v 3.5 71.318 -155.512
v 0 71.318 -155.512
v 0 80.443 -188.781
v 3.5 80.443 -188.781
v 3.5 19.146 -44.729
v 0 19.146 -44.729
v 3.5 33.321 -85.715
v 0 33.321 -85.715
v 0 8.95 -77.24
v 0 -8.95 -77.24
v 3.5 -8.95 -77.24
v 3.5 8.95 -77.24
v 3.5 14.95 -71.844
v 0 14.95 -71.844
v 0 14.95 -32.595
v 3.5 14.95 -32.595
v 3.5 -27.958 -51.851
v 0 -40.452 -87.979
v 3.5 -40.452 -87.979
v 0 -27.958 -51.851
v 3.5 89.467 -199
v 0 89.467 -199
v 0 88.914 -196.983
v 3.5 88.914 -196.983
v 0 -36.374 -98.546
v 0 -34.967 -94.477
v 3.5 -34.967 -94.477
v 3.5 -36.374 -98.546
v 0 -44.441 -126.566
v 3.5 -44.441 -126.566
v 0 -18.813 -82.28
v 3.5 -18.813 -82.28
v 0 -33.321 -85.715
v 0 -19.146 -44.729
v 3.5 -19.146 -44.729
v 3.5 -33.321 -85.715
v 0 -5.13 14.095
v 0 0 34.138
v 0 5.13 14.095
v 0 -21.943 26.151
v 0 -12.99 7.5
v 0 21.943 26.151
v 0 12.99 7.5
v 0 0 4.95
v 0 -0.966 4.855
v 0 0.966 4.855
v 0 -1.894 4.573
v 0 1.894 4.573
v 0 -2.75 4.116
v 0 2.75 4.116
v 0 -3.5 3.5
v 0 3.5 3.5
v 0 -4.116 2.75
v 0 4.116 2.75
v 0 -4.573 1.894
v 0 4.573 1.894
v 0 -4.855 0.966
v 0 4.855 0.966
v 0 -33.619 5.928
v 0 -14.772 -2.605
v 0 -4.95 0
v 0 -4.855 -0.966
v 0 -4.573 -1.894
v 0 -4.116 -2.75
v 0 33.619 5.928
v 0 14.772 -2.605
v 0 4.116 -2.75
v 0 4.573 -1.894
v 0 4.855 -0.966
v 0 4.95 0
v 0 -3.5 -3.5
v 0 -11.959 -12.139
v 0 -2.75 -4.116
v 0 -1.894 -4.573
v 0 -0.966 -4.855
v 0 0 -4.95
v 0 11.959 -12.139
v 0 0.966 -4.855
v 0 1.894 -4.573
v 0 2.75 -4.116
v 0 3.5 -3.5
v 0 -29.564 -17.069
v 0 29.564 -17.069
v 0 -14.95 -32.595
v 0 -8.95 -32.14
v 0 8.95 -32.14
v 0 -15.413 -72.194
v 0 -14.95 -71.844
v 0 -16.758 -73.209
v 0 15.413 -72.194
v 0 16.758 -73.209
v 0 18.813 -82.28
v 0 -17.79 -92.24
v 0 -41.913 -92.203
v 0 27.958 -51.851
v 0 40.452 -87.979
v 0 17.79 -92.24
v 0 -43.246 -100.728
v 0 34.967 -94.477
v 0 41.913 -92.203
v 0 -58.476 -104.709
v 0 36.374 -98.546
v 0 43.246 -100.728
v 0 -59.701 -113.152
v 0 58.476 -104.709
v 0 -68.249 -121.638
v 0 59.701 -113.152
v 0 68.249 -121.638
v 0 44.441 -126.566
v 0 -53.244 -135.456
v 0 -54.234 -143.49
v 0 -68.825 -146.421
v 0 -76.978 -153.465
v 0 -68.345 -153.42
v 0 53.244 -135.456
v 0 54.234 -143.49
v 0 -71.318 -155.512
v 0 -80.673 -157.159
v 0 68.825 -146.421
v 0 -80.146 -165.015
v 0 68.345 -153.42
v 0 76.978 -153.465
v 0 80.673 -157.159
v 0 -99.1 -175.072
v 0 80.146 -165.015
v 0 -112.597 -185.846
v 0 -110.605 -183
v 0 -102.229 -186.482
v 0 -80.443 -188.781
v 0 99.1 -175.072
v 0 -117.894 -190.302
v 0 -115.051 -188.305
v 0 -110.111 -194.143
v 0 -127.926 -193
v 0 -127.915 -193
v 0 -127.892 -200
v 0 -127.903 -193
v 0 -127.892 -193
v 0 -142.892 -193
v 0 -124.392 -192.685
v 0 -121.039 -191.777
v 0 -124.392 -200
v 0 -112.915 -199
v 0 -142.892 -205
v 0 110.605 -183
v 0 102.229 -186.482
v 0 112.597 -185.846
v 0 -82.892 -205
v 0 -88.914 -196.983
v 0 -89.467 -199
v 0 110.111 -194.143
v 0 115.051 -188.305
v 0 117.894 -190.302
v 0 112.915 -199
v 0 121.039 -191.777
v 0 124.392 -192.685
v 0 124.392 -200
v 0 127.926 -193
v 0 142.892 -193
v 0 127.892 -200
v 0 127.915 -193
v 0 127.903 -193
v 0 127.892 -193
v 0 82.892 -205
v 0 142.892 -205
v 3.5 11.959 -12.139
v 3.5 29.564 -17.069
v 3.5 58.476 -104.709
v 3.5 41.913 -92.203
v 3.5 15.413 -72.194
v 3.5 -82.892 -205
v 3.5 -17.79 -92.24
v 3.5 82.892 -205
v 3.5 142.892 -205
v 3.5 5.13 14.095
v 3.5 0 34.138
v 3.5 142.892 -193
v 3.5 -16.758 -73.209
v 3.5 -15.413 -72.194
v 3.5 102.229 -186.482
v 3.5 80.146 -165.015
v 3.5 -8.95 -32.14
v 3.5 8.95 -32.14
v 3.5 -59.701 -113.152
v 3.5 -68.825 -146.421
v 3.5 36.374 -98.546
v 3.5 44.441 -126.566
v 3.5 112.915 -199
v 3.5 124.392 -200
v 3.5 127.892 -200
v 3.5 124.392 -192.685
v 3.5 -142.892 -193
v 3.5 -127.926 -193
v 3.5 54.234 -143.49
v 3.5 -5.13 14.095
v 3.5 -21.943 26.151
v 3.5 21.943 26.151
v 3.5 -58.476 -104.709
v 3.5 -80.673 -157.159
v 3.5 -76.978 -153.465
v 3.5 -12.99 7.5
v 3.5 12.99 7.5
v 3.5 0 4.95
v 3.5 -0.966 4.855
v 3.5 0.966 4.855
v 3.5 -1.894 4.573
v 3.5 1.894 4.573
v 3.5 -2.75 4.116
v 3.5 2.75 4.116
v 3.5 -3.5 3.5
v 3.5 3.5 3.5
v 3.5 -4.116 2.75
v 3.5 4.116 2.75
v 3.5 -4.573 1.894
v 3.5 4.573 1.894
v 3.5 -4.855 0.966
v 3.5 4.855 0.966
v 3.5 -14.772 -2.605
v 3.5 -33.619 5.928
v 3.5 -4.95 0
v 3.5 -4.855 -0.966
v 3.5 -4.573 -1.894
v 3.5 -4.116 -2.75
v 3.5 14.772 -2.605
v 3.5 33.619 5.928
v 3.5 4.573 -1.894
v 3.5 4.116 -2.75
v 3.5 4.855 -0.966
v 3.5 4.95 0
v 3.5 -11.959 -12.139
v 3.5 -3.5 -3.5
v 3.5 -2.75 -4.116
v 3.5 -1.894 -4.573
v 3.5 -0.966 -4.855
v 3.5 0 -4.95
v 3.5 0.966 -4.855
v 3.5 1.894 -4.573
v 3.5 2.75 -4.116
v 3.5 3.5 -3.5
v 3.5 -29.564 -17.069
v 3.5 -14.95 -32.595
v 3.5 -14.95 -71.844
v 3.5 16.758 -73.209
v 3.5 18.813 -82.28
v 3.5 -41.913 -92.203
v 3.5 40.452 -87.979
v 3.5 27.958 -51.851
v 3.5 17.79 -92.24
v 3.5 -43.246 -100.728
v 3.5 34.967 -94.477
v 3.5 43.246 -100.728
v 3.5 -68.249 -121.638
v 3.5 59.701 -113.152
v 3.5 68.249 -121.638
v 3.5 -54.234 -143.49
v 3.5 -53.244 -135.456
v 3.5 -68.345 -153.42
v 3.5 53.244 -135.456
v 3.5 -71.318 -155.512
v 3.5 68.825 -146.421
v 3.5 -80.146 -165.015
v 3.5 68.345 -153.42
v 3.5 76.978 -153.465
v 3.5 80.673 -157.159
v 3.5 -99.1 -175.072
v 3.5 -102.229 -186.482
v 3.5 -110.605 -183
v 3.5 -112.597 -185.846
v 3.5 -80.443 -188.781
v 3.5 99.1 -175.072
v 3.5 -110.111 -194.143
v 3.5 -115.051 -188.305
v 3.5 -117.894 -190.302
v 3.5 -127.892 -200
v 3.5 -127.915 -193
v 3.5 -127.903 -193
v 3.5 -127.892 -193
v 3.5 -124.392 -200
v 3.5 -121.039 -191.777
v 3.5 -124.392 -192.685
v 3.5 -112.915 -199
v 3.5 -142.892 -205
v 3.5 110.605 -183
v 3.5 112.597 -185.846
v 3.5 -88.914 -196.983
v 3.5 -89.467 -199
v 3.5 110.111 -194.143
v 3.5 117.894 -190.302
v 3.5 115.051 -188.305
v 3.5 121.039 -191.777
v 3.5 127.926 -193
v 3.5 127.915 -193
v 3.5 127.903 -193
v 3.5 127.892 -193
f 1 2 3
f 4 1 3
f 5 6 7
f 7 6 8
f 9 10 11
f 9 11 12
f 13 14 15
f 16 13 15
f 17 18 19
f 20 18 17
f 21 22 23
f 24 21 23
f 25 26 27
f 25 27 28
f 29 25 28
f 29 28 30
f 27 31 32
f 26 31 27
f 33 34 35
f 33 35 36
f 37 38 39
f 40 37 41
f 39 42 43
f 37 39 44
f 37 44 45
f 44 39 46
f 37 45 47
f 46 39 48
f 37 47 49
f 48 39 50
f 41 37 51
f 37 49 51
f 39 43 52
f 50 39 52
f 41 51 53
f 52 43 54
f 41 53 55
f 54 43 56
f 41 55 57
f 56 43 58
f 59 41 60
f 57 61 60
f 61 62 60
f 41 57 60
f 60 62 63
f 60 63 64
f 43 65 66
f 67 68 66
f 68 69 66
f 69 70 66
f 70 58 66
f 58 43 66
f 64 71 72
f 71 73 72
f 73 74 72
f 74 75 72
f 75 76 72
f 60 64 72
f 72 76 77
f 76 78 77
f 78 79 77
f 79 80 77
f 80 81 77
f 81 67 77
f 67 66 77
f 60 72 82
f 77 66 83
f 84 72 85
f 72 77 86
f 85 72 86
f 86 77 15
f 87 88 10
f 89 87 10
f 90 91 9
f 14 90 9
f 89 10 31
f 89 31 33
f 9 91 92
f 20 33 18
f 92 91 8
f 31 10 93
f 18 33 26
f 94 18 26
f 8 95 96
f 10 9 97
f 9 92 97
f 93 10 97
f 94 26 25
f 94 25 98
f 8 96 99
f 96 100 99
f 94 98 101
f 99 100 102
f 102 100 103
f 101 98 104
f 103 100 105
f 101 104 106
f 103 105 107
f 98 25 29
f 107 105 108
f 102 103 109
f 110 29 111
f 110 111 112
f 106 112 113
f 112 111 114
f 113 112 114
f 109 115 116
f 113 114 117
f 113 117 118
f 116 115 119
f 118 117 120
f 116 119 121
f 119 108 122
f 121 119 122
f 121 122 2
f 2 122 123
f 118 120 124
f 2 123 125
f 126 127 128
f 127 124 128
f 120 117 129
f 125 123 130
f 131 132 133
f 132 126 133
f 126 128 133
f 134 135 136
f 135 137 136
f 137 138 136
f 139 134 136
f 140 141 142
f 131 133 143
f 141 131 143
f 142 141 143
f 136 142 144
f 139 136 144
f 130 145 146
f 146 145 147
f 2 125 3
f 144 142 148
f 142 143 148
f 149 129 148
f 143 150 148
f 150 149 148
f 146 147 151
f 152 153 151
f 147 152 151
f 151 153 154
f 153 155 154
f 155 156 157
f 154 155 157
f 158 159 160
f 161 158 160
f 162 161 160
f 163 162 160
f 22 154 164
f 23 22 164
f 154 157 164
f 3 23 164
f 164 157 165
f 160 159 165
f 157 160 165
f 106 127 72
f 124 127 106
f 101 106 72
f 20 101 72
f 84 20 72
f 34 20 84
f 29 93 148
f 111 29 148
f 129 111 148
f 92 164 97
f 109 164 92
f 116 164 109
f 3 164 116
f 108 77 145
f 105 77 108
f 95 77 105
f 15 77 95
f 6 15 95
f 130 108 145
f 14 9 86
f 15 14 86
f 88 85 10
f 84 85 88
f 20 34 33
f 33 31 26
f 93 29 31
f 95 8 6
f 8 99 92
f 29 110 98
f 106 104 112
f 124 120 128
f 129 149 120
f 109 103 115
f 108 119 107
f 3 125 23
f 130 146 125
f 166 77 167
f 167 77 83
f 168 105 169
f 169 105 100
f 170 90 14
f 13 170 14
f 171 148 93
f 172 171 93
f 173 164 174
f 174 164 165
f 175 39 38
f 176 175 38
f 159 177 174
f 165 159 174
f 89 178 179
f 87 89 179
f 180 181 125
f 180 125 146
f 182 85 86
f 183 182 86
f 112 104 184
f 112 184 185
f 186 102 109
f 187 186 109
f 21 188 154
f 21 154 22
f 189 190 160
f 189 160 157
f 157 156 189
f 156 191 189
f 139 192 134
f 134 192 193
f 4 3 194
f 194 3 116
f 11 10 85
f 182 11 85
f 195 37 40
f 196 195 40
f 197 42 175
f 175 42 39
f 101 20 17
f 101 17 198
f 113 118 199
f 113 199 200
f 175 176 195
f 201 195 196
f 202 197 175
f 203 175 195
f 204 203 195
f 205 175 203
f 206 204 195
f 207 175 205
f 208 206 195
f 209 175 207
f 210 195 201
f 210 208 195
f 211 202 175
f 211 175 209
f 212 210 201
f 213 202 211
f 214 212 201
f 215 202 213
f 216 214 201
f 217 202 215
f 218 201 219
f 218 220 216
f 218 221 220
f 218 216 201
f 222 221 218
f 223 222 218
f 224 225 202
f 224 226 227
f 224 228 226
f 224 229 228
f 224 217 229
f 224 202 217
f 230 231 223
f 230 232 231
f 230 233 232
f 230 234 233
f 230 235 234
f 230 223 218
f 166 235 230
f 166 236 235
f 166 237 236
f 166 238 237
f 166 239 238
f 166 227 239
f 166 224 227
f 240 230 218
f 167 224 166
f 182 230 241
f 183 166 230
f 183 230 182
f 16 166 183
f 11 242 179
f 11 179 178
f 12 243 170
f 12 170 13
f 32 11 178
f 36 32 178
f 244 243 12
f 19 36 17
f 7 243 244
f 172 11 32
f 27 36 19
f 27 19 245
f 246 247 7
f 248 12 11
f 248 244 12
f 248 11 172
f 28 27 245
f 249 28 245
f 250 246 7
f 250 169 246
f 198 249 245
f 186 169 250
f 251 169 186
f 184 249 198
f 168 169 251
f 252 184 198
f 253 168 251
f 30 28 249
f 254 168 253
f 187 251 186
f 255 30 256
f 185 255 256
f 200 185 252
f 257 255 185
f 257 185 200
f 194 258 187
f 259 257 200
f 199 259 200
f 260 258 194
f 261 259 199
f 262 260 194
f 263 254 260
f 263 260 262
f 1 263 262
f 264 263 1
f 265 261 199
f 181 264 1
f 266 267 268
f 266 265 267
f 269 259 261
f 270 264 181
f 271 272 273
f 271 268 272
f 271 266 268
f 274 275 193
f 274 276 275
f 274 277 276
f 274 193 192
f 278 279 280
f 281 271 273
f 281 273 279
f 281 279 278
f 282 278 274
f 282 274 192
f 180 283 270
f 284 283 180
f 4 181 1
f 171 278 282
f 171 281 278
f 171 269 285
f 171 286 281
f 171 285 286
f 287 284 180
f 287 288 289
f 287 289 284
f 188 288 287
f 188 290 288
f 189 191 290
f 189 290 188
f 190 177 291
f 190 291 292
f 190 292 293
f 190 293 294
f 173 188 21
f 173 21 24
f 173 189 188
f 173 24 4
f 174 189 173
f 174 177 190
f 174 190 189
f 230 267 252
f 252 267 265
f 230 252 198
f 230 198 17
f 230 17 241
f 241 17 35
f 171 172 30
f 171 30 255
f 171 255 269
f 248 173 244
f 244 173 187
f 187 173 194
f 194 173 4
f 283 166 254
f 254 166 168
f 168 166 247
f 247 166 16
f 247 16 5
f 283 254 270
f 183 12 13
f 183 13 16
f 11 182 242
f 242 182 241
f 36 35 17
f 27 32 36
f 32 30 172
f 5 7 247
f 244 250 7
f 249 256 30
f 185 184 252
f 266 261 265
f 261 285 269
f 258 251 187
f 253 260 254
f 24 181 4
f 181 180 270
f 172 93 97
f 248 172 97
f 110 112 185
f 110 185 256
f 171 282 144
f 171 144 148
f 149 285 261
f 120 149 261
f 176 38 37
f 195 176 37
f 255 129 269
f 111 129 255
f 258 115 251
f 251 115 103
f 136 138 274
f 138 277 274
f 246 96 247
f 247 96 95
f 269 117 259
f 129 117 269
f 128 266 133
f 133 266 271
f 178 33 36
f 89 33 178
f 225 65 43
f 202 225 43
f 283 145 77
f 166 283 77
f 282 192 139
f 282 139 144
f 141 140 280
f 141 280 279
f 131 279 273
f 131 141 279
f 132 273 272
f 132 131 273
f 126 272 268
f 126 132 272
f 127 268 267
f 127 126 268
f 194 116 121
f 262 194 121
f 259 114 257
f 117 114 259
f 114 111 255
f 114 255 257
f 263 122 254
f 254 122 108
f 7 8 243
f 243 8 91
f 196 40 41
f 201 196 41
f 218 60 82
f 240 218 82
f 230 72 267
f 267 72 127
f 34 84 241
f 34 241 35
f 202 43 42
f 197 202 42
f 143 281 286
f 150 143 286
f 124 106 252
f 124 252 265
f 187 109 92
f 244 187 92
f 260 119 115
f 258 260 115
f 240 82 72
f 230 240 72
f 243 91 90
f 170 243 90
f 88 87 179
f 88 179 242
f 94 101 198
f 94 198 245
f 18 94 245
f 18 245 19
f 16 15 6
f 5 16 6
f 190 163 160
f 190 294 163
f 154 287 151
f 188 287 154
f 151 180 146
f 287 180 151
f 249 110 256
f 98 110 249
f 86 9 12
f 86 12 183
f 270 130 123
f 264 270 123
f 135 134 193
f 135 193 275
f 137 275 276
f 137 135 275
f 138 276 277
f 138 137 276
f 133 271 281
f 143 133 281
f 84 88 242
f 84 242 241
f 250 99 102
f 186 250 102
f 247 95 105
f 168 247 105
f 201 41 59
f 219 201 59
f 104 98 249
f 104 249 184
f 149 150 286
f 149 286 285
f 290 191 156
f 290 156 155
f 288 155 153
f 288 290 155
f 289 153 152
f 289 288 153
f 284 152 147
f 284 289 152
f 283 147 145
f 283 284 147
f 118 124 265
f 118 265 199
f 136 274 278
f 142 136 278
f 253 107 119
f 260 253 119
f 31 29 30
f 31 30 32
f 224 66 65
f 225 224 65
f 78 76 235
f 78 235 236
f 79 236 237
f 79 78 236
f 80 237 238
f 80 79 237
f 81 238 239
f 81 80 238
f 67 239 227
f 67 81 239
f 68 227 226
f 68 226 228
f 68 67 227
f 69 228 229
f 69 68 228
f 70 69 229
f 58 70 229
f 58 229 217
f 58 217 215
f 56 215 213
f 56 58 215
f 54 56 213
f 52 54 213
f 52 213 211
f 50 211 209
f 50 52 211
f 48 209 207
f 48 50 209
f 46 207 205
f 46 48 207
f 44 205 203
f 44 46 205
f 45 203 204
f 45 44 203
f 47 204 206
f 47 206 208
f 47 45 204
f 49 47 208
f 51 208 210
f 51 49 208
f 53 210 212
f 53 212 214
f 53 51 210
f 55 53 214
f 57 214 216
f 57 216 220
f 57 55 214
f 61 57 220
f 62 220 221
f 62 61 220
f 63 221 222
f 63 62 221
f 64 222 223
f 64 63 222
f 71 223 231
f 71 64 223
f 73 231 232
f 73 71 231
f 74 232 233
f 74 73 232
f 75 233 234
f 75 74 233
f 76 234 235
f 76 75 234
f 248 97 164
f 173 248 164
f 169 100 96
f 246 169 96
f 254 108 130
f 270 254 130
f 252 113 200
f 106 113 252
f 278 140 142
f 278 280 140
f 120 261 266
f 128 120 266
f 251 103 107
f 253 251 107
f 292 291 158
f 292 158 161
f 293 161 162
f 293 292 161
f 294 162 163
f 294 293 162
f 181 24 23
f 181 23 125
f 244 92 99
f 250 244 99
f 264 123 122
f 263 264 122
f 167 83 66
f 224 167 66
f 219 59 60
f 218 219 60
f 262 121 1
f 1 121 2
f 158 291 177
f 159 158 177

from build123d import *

# Parameters (mm, degrees)
SKETCH1_R               = 4.95
SKETCH1_W               = 17.9
SKETCH1_H               = 45.1
BOSS_EXTRUDE1_DEPTH     = 3.5
CUT_EXTRUDE1_DEPTH      = 251.796682357
CUT_EXTRUDE1_DEPTH_BACK = 251.796682357
SKETCH2_W               = 258.160615752
SKETCH2_H               = 10
SKETCH3_W               = 12
SKETCH3_H               = 60
BOSS_EXTRUDE2_DEPTH     = 3.5
FILLET1_R               = 20
BOSS_EXTRUDE3_START     = -3.5
BOSS_EXTRUDE3_DEPTH     = 3.5
CIRPATTERN1_COUNT       = 9
SKETCH5_W               = 17
SKETCH5_H               = 3.5
CUT_EXTRUDE2_DEPTH      = 250.910895112
CUT_EXTRUDE3_DEPTH      = 250.910895112


with BuildPart() as part:
    # Sketch1 → Boss-Extrude1 (new body)
    with BuildSketch(Plane.YZ):
        with BuildLine():
            Line((-10.899695646, -10.305175148), (-129.080307876, -215))
            Line((-129.080307876, -215), (-88.665789032, -215))
            Line((-88.665789032, -215), (-17.790269987, -92.24))
            Line((-17.790269987, -92.24), (17.790269987, -92.24))
            Line((17.790269987, -92.24), (88.665789032, -215))
            Line((88.665789032, -215), (129.080307876, -215))
            Line((129.080307876, -215), (10.899695646, -10.305175148))
            ThreePointArc((10.899695646, -10.305175148), (0, 15), (-10.899695646, -10.305175148))
        make_face()
        Circle(SKETCH1_R, mode=Mode.SUBTRACT)
        with Locations((0, -54.69)):
            Rectangle(SKETCH1_W, SKETCH1_H, mode=Mode.SUBTRACT)
    extrude(amount=BOSS_EXTRUDE1_DEPTH)

    # Sketch2 → Cut-Extrude1 (cut, two sides: drawn at the far end of the back side and taken through both)
    with BuildSketch(Plane.YZ.offset(3.5).offset(-CUT_EXTRUDE1_DEPTH_BACK)):
        with Locations((0, -210)):
            Rectangle(SKETCH2_W, SKETCH2_H)
    extrude(amount=CUT_EXTRUDE1_DEPTH + CUT_EXTRUDE1_DEPTH_BACK, mode=Mode.SUBTRACT)

    # Sketch3 → Boss-Extrude2 (add)
    with BuildSketch(Plane(origin=(3.5, 0, 0), x_dir=(0, 0, -1), z_dir=(1, 0, 0))):
        with Locations((199, -112.892286341)):
            Rectangle(SKETCH3_W, SKETCH3_H)
        with Locations((199, 112.892286341)):
            Rectangle(SKETCH3_W, SKETCH3_H)
    extrude(amount=-BOSS_EXTRUDE2_DEPTH)

    # Fillet1
    fillet1_edges = [part.edges().sort_by_distance(p)[0] for p in [
        (1.75, 116.378601954, -193),
        (1.75, -116.378601954, -193),
    ]]
    fillet(fillet1_edges, radius=FILLET1_R)

    # Sketch4 → Boss-Extrude3 (add)
    with BuildSketch(Plane(origin=(3.5, 0, 0), x_dir=(0, 0, -1), z_dir=(1, 0, 0)).offset(BOSS_EXTRUDE3_START)):
        with BuildLine():
            Line((-34.137962787, 0), (-14.095389312, -5.13030215))
            ThreePointArc((-14.095389312, -5.13030215), (-15, 0), (-14.095389312, 5.13030215))
            Line((-14.095389312, 5.13030215), (-34.137962787, 0))
        make_face()
    boss_extrude3 = extrude(amount=BOSS_EXTRUDE3_DEPTH)

    # CirPattern1: Boss-Extrude3 ×9 about axis
    cirpattern1_axis = Axis((-0.1751615, 0, 0), (1, 0, 0))
    for i in range(1, CIRPATTERN1_COUNT):
        add(boss_extrude3.rotate(cirpattern1_axis, i * 360 / CIRPATTERN1_COUNT))

    # Sketch5 → Cut-Extrude2 (cut, symmetric)
    with BuildSketch(Plane(origin=(3.5, 0, 0), x_dir=(0, 0, -1), z_dir=(1, 0, 0))):
        with Locations((191.5, -126.142286341)):
            Rectangle(SKETCH5_W, SKETCH5_H)
    cut_extrude2 = extrude(amount=CUT_EXTRUDE2_DEPTH, both=True, mode=Mode.SUBTRACT)

    # Mirror1: Cut-Extrude2 across plane
    add(cut_extrude2.mirror(Plane.ZX), mode=Mode.SUBTRACT)

    # Sketch6 → Cut-Extrude3 (cut, symmetric)
    with BuildSketch(Plane.YZ.offset(3.5)):
        Polygon((-44.440620352, -126.565865893), (-18.81339339, -82.279763058), (-34.966746745, -94.476691336), (-36.374058239, -98.54606889), align=None)
        Polygon((-33.320603167, -85.715441185), (-14.95, -71.844331927), (-14.95, -32.59506202), align=None)
        Polygon((-80.442842118, -188.780872527), (-54.234238638, -143.490099921), (-71.318419935, -155.512353255), align=None)
        Polygon((-41.912952433, -92.203274728), (-27.957868434, -51.850797102), (-58.475794969, -104.709396402), align=None)
        Polygon((-112.914500338, -199), (-89.467175046, -199), (-80.146284863, -165.015139537), (-110.110561046, -194.143434684), align=None)
        Polygon((-76.978433226, -153.464848336), (-68.249306861, -121.637615567), (-99.099637478, -175.071955626), (-80.672732205, -157.159147315), align=None)
        Polygon((-43.245914121, -100.728050325), (-59.700544534, -113.152464165), (-68.824966717, -146.420983438), (-53.243788825, -135.456403713), align=None)
    cut_extrude3 = extrude(amount=CUT_EXTRUDE3_DEPTH, both=True, mode=Mode.SUBTRACT)

    # Mirror2: Cut-Extrude3 across plane
    add(cut_extrude3.mirror(Plane.ZX), mode=Mode.SUBTRACT)


solid = part.part
